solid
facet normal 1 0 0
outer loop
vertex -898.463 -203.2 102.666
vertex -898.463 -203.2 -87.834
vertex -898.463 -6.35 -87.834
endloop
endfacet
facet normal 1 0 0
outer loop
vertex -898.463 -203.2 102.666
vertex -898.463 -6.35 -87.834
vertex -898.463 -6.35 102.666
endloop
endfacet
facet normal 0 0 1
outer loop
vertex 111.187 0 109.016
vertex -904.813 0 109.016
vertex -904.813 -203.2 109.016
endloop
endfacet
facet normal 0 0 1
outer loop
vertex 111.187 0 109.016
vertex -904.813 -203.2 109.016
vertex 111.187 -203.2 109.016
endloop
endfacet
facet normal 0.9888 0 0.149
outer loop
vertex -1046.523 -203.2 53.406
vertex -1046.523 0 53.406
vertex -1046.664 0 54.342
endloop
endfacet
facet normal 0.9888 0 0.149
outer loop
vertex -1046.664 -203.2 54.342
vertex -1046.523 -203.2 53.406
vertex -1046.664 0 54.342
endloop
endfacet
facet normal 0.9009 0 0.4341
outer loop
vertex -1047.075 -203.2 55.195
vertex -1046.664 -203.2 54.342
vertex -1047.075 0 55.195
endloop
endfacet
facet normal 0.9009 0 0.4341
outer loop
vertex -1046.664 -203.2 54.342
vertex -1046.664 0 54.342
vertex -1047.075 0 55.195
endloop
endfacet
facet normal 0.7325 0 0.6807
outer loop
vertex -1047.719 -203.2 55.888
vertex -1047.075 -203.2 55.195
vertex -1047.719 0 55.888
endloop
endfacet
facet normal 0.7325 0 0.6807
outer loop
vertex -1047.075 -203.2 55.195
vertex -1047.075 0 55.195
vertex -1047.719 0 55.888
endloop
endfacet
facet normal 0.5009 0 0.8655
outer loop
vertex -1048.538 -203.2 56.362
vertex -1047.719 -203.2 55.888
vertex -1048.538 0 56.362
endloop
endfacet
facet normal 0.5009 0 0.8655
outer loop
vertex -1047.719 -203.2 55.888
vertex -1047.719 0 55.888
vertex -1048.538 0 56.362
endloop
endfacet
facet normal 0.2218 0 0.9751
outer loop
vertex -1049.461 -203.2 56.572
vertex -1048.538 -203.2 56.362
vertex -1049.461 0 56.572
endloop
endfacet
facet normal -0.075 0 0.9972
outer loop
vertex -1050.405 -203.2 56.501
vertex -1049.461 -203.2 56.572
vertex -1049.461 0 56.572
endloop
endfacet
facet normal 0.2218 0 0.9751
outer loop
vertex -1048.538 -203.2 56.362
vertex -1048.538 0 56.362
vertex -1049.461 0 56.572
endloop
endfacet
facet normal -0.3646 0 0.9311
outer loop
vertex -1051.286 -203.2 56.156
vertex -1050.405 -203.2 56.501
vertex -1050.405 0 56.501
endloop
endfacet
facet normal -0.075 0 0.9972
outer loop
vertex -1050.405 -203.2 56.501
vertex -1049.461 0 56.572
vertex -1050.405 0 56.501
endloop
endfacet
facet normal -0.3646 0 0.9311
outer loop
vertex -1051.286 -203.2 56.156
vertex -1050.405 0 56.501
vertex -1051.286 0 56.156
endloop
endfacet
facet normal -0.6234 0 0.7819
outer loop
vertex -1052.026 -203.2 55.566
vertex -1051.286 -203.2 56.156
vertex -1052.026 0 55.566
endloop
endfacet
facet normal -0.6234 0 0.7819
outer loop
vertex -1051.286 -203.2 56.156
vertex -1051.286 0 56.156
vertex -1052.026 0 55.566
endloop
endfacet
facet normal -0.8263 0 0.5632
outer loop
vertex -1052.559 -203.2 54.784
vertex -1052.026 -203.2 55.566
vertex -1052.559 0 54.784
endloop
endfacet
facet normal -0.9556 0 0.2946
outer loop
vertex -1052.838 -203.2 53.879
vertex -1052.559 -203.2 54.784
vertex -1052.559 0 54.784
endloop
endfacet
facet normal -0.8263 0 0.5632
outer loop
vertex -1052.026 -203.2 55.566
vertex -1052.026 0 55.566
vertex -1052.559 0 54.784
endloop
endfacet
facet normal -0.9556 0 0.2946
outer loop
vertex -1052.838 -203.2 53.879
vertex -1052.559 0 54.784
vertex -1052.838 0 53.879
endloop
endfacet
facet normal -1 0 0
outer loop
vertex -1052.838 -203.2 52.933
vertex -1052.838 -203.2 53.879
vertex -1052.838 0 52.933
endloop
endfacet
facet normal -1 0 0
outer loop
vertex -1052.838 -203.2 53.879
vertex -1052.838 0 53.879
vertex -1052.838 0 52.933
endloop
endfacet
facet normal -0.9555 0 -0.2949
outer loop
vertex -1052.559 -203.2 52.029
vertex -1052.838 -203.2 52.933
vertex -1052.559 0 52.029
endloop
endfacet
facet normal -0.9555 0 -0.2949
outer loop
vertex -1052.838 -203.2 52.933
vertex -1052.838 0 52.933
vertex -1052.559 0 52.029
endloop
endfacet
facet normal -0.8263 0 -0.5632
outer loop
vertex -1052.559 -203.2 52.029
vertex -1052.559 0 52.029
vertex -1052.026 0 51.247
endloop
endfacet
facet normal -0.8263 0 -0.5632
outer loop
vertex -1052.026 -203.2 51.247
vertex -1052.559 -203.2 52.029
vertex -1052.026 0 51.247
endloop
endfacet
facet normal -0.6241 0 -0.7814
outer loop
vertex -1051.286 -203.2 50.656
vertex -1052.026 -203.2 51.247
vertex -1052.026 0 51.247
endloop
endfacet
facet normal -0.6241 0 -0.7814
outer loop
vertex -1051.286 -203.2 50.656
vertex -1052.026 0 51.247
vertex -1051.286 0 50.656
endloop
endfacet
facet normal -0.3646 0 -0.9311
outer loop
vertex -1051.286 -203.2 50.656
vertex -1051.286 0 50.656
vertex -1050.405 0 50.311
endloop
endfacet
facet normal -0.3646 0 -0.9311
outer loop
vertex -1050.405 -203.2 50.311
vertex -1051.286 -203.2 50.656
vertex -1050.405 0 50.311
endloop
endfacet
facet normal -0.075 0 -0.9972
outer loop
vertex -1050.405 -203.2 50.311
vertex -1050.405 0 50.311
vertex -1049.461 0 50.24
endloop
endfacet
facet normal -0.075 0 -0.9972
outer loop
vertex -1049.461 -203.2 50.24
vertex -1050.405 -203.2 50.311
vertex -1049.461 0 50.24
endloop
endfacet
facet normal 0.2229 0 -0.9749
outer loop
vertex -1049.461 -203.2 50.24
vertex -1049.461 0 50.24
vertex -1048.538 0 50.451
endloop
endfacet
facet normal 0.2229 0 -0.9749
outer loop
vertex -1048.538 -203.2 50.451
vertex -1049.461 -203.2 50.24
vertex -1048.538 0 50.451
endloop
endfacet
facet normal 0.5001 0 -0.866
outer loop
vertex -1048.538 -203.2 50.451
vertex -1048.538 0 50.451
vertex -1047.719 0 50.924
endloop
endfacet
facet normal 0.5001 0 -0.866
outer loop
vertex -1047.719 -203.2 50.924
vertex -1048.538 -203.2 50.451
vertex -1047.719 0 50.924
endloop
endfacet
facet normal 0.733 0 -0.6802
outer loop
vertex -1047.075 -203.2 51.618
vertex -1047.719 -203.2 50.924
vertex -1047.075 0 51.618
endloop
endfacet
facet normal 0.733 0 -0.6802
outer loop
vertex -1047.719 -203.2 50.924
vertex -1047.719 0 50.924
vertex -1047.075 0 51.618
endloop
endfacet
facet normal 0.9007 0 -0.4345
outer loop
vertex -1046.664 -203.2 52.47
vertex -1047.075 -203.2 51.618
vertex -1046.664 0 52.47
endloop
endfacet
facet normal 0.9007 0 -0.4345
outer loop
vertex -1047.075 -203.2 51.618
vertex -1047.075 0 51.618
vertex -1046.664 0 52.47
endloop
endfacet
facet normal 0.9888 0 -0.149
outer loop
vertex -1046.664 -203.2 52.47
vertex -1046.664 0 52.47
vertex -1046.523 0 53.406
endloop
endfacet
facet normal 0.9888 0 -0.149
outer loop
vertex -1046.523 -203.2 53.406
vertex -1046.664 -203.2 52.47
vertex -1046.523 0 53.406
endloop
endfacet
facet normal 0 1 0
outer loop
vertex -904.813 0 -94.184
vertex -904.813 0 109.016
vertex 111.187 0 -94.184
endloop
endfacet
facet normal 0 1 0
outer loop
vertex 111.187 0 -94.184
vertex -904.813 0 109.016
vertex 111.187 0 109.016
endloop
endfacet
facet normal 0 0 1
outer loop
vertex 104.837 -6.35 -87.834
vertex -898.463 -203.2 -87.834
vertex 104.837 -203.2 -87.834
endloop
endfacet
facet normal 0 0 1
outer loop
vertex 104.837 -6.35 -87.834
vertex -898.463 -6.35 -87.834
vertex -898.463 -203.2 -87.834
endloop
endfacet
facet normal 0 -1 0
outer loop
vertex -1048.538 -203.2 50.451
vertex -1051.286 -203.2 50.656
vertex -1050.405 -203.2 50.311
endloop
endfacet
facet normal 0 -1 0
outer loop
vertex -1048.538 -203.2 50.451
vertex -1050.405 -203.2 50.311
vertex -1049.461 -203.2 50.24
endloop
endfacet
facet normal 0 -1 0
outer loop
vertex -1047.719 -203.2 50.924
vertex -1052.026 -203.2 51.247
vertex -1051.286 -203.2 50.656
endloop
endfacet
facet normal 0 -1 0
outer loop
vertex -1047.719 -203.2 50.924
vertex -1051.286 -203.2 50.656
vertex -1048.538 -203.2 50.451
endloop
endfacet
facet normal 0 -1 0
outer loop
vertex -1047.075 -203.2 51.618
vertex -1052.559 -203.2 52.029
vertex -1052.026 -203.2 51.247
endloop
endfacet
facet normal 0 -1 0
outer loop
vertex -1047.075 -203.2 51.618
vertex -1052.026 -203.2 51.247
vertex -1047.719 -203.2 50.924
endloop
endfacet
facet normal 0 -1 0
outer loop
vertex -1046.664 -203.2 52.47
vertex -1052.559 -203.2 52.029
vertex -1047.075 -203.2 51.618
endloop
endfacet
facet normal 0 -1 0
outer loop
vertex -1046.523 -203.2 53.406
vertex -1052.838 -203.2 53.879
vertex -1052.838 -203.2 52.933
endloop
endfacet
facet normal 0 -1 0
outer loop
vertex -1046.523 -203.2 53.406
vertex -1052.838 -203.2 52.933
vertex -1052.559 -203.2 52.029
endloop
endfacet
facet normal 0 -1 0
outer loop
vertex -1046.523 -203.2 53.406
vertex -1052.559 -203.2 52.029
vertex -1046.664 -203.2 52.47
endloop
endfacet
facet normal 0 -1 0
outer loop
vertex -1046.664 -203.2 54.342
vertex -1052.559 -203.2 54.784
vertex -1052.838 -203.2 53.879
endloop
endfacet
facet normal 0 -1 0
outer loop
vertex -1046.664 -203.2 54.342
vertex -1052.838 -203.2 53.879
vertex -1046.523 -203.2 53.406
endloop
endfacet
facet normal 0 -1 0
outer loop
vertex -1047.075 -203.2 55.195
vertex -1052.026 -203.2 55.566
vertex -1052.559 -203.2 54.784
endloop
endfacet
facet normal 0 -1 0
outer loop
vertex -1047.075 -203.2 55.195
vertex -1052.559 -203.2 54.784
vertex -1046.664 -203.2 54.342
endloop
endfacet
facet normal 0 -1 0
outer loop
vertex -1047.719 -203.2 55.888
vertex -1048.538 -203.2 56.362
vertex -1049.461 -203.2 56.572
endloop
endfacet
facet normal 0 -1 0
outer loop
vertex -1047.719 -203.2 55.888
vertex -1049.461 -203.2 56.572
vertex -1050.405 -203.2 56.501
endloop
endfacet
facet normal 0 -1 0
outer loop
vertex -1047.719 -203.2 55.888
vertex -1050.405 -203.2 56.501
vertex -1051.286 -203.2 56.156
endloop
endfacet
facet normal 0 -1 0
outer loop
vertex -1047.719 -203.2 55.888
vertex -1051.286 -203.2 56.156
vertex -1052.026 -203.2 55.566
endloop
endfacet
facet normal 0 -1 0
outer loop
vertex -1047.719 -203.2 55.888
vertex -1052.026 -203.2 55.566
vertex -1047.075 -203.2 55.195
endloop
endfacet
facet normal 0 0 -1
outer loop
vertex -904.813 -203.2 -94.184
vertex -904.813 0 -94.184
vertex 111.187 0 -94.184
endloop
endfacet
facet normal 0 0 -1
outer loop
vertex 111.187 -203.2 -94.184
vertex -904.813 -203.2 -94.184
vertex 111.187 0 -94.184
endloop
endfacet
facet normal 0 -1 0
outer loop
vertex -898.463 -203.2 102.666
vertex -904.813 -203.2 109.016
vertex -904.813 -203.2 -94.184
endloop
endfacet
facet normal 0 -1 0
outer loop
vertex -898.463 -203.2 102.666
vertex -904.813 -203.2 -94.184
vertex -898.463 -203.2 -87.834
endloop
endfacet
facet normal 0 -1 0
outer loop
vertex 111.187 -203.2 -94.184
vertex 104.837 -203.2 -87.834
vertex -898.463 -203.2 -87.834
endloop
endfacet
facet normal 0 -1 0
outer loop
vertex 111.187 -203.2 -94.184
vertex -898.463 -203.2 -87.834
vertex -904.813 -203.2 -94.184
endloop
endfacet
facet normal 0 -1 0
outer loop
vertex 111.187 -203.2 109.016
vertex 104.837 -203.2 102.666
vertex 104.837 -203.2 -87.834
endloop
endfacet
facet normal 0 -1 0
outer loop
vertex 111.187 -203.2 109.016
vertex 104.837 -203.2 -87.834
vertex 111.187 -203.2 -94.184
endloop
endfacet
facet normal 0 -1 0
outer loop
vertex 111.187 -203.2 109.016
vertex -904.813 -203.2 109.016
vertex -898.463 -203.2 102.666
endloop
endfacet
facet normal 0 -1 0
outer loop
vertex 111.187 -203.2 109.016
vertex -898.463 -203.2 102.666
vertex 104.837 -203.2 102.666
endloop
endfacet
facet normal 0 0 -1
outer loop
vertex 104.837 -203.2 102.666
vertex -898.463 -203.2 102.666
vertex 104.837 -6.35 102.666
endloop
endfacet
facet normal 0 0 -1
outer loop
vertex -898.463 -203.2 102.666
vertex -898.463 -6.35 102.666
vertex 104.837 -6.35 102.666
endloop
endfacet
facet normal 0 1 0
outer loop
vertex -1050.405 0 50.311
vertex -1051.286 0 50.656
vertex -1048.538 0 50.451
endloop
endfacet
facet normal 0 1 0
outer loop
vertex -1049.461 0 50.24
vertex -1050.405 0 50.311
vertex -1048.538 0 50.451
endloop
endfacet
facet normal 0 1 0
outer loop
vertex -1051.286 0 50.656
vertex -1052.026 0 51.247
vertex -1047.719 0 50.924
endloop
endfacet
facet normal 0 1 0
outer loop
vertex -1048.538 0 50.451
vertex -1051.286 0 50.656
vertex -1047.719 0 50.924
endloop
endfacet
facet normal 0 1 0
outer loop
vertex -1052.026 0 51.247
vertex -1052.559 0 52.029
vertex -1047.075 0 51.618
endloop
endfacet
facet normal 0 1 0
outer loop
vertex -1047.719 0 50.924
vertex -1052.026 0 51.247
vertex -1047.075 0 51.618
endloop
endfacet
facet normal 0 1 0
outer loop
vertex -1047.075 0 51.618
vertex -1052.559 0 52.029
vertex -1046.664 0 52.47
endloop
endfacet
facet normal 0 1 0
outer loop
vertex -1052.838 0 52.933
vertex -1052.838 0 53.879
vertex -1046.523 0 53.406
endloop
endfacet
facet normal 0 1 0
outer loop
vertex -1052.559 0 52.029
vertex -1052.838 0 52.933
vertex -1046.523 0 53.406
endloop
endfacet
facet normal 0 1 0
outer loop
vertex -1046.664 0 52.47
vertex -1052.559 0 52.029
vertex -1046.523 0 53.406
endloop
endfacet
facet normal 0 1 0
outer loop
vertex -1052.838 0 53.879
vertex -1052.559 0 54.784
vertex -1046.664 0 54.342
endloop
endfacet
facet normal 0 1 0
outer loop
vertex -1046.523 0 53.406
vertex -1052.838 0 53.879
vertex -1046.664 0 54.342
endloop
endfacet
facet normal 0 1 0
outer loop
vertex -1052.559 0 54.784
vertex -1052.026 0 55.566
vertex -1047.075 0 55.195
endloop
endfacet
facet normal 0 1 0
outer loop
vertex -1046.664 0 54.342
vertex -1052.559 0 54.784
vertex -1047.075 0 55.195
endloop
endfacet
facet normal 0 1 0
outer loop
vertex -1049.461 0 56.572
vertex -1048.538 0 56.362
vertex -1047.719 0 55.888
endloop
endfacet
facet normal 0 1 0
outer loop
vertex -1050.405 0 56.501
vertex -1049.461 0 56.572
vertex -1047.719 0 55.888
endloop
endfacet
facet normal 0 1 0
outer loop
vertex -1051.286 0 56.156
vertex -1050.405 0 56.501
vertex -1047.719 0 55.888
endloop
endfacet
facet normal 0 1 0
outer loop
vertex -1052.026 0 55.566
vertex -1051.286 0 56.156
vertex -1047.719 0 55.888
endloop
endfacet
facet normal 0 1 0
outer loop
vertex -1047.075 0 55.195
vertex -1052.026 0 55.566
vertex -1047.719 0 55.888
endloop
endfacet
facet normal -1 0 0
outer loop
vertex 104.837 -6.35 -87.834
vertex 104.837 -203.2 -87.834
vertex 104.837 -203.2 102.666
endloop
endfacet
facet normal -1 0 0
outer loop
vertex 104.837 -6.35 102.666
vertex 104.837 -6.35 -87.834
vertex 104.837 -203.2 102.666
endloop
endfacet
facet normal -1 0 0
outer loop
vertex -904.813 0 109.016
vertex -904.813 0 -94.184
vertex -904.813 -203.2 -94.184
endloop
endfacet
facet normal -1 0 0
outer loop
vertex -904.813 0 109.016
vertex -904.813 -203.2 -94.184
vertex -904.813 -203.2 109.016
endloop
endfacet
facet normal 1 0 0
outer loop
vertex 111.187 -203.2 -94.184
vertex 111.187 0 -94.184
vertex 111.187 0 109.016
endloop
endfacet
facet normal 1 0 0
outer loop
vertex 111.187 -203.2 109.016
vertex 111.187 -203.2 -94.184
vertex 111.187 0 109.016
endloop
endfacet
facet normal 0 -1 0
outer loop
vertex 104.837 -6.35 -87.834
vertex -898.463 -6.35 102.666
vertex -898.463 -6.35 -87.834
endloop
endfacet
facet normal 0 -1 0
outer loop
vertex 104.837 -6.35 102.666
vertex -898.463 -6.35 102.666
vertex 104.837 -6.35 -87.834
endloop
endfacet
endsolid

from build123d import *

# Parameters (mm, degrees)
F0_W     = 1016
F0_H     = 203.2
F1_DEPTH = 203.2
F2_T     = -6.35
F3_R     = 3.175
F4_DEPTH = 203.2


with BuildPart() as f1:
    # F0 (on Front) → F1 (new body)
    with BuildSketch(Plane.XZ):
        with Locations((-396.813076, 7.415561)):
            Rectangle(F0_W, F0_H)
    extrude(amount=F1_DEPTH)

    # F2
    f2_openings = [f1.faces().sort_by_distance(p)[0] for p in [
        (-396.813076, -203.2, 7.415561),
    ]]
    offset(amount=F2_T, openings=f2_openings)


with BuildPart() as f4:
    # F3 (on Front) → F4 (new body)
    with BuildSketch(Plane.XZ):
        with Locations((-1049.698234, 53.406097)):
            Circle(F3_R)
    extrude(amount=F4_DEPTH)


solid = Compound([f1.part, f4.part])
